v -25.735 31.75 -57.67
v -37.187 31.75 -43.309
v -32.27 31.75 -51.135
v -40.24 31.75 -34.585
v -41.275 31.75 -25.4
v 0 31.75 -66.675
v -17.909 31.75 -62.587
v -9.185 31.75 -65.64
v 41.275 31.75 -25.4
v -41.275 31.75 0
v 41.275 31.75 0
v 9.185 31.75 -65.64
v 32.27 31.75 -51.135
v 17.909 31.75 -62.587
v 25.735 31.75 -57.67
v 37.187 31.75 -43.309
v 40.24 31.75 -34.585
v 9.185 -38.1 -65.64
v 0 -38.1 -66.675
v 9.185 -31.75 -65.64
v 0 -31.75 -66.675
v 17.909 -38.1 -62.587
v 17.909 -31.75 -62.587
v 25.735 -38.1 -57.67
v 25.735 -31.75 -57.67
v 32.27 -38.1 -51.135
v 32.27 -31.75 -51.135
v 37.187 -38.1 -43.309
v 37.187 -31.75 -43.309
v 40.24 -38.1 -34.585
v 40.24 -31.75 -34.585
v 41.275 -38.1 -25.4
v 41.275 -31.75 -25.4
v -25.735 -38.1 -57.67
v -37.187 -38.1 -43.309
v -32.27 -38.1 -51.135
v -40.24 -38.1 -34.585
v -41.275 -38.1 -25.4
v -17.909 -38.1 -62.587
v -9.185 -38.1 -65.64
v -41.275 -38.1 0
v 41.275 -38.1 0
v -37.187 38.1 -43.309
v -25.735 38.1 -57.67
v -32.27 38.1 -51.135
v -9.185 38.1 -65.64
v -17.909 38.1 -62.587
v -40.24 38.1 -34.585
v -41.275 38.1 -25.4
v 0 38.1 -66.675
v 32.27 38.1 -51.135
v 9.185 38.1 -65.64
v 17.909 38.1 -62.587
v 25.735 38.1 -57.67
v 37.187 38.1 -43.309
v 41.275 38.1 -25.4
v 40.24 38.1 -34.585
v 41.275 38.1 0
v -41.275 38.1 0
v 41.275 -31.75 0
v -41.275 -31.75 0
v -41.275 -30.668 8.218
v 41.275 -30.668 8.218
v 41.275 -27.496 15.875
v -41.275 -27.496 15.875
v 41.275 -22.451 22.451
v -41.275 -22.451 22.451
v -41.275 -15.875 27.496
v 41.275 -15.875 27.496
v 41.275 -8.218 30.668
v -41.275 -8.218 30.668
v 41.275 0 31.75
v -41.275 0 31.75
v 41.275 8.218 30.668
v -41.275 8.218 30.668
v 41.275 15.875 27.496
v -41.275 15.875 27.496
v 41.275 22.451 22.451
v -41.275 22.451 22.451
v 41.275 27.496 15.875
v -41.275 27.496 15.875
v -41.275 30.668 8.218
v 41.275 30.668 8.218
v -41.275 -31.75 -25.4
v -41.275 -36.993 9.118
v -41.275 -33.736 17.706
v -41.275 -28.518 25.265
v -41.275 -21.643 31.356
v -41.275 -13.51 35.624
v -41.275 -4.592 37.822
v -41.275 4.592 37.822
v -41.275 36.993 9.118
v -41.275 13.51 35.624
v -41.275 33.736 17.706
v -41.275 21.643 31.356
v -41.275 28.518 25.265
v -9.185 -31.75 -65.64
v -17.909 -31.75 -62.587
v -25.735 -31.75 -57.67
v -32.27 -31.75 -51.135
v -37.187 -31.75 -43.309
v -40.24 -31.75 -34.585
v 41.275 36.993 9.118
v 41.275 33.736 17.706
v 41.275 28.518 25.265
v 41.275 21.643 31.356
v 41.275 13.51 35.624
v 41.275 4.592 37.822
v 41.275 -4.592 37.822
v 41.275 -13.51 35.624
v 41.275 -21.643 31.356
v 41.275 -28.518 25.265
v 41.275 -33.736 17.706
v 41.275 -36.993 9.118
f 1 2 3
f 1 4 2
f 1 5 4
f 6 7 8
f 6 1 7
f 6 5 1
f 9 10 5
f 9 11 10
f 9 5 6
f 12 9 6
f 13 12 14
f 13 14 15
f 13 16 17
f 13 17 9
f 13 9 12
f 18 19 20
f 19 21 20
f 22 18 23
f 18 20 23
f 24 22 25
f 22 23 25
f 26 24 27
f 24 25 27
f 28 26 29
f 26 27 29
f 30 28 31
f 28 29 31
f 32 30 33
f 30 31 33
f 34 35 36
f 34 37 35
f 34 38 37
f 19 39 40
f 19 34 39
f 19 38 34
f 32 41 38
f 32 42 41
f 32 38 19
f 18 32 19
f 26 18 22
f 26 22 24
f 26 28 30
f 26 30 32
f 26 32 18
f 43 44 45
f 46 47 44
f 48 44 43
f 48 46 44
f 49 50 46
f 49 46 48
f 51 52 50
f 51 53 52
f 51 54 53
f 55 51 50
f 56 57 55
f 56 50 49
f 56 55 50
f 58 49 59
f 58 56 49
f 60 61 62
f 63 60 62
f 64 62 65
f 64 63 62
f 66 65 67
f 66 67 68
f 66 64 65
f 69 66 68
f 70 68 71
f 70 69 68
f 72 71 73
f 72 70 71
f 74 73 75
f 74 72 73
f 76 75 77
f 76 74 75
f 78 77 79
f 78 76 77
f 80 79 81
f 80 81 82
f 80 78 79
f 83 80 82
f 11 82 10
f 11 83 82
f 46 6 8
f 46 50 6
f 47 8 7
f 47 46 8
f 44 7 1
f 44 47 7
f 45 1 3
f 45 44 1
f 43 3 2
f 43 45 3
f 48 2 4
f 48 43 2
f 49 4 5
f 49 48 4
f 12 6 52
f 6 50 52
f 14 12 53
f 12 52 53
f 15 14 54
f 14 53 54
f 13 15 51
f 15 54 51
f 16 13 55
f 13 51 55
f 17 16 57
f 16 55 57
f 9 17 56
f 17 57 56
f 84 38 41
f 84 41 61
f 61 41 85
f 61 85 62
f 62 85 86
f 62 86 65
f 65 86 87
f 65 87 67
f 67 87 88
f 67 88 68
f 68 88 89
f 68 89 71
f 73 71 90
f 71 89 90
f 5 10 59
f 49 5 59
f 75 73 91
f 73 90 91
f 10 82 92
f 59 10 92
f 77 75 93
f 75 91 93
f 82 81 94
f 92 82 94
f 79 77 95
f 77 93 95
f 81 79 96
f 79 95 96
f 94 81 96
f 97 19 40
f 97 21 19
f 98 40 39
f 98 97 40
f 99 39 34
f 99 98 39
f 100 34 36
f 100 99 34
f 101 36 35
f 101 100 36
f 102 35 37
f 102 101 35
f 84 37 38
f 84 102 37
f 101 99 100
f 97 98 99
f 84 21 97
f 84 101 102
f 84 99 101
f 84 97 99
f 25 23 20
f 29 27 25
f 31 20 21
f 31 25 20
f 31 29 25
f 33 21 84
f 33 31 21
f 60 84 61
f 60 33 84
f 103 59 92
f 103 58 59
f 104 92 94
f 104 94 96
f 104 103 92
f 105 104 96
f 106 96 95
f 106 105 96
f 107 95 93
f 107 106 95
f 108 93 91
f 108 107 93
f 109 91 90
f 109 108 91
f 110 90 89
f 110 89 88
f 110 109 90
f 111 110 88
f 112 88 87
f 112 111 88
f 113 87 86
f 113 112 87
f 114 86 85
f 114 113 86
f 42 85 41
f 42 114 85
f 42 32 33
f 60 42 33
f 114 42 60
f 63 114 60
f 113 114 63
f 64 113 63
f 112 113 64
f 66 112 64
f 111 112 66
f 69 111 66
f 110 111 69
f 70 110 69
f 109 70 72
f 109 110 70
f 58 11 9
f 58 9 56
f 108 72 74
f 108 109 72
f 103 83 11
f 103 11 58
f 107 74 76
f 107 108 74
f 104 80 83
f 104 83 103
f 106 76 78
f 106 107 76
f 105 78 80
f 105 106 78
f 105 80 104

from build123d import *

# Parameters (mm, degrees)
F1_DEPTH = 41.275
F2_R     = 41.27499


# Not quite as in the source:
# - a fillet or chamfer is up to 0.001 mm smaller than in the source, because OpenCascade refuses the exact size


with BuildPart() as f1:
    # F0 (on Right) → F1 (new body, symmetric)
    with BuildSketch(Plane.YZ):
        with BuildLine():
            ThreePointArc((38.1, 0), (0, 38.1), (-38.1, 0))
            Line((-38.1, 0), (-38.1, -66.675))
            Line((-38.1, -66.675), (-31.75, -66.675))
            Line((-31.75, -66.675), (-31.75, 0))
            ThreePointArc((-31.75, 0), (0, 31.75), (31.75, 0))
            Line((31.75, 0), (31.75, -66.675))
            Line((31.75, -66.675), (38.1, -66.675))
            Line((38.1, -66.675), (38.1, 0))
        make_face()
    extrude(amount=F1_DEPTH, both=True)

    # F2 (radius 41.275 in the source; OpenCascade refuses exactly that, so slightly less here)
    f2_edges = [f1.edges().sort_by_distance(p)[0] for p in [
        (-41.275, 34.925, -66.675),
        (-41.275, -34.925, -66.675),
        (41.275, -34.925, -66.675),
        (41.275, 34.925, -66.675),
    ]]
    fillet(f2_edges, radius=F2_R)


solid = f1.part
